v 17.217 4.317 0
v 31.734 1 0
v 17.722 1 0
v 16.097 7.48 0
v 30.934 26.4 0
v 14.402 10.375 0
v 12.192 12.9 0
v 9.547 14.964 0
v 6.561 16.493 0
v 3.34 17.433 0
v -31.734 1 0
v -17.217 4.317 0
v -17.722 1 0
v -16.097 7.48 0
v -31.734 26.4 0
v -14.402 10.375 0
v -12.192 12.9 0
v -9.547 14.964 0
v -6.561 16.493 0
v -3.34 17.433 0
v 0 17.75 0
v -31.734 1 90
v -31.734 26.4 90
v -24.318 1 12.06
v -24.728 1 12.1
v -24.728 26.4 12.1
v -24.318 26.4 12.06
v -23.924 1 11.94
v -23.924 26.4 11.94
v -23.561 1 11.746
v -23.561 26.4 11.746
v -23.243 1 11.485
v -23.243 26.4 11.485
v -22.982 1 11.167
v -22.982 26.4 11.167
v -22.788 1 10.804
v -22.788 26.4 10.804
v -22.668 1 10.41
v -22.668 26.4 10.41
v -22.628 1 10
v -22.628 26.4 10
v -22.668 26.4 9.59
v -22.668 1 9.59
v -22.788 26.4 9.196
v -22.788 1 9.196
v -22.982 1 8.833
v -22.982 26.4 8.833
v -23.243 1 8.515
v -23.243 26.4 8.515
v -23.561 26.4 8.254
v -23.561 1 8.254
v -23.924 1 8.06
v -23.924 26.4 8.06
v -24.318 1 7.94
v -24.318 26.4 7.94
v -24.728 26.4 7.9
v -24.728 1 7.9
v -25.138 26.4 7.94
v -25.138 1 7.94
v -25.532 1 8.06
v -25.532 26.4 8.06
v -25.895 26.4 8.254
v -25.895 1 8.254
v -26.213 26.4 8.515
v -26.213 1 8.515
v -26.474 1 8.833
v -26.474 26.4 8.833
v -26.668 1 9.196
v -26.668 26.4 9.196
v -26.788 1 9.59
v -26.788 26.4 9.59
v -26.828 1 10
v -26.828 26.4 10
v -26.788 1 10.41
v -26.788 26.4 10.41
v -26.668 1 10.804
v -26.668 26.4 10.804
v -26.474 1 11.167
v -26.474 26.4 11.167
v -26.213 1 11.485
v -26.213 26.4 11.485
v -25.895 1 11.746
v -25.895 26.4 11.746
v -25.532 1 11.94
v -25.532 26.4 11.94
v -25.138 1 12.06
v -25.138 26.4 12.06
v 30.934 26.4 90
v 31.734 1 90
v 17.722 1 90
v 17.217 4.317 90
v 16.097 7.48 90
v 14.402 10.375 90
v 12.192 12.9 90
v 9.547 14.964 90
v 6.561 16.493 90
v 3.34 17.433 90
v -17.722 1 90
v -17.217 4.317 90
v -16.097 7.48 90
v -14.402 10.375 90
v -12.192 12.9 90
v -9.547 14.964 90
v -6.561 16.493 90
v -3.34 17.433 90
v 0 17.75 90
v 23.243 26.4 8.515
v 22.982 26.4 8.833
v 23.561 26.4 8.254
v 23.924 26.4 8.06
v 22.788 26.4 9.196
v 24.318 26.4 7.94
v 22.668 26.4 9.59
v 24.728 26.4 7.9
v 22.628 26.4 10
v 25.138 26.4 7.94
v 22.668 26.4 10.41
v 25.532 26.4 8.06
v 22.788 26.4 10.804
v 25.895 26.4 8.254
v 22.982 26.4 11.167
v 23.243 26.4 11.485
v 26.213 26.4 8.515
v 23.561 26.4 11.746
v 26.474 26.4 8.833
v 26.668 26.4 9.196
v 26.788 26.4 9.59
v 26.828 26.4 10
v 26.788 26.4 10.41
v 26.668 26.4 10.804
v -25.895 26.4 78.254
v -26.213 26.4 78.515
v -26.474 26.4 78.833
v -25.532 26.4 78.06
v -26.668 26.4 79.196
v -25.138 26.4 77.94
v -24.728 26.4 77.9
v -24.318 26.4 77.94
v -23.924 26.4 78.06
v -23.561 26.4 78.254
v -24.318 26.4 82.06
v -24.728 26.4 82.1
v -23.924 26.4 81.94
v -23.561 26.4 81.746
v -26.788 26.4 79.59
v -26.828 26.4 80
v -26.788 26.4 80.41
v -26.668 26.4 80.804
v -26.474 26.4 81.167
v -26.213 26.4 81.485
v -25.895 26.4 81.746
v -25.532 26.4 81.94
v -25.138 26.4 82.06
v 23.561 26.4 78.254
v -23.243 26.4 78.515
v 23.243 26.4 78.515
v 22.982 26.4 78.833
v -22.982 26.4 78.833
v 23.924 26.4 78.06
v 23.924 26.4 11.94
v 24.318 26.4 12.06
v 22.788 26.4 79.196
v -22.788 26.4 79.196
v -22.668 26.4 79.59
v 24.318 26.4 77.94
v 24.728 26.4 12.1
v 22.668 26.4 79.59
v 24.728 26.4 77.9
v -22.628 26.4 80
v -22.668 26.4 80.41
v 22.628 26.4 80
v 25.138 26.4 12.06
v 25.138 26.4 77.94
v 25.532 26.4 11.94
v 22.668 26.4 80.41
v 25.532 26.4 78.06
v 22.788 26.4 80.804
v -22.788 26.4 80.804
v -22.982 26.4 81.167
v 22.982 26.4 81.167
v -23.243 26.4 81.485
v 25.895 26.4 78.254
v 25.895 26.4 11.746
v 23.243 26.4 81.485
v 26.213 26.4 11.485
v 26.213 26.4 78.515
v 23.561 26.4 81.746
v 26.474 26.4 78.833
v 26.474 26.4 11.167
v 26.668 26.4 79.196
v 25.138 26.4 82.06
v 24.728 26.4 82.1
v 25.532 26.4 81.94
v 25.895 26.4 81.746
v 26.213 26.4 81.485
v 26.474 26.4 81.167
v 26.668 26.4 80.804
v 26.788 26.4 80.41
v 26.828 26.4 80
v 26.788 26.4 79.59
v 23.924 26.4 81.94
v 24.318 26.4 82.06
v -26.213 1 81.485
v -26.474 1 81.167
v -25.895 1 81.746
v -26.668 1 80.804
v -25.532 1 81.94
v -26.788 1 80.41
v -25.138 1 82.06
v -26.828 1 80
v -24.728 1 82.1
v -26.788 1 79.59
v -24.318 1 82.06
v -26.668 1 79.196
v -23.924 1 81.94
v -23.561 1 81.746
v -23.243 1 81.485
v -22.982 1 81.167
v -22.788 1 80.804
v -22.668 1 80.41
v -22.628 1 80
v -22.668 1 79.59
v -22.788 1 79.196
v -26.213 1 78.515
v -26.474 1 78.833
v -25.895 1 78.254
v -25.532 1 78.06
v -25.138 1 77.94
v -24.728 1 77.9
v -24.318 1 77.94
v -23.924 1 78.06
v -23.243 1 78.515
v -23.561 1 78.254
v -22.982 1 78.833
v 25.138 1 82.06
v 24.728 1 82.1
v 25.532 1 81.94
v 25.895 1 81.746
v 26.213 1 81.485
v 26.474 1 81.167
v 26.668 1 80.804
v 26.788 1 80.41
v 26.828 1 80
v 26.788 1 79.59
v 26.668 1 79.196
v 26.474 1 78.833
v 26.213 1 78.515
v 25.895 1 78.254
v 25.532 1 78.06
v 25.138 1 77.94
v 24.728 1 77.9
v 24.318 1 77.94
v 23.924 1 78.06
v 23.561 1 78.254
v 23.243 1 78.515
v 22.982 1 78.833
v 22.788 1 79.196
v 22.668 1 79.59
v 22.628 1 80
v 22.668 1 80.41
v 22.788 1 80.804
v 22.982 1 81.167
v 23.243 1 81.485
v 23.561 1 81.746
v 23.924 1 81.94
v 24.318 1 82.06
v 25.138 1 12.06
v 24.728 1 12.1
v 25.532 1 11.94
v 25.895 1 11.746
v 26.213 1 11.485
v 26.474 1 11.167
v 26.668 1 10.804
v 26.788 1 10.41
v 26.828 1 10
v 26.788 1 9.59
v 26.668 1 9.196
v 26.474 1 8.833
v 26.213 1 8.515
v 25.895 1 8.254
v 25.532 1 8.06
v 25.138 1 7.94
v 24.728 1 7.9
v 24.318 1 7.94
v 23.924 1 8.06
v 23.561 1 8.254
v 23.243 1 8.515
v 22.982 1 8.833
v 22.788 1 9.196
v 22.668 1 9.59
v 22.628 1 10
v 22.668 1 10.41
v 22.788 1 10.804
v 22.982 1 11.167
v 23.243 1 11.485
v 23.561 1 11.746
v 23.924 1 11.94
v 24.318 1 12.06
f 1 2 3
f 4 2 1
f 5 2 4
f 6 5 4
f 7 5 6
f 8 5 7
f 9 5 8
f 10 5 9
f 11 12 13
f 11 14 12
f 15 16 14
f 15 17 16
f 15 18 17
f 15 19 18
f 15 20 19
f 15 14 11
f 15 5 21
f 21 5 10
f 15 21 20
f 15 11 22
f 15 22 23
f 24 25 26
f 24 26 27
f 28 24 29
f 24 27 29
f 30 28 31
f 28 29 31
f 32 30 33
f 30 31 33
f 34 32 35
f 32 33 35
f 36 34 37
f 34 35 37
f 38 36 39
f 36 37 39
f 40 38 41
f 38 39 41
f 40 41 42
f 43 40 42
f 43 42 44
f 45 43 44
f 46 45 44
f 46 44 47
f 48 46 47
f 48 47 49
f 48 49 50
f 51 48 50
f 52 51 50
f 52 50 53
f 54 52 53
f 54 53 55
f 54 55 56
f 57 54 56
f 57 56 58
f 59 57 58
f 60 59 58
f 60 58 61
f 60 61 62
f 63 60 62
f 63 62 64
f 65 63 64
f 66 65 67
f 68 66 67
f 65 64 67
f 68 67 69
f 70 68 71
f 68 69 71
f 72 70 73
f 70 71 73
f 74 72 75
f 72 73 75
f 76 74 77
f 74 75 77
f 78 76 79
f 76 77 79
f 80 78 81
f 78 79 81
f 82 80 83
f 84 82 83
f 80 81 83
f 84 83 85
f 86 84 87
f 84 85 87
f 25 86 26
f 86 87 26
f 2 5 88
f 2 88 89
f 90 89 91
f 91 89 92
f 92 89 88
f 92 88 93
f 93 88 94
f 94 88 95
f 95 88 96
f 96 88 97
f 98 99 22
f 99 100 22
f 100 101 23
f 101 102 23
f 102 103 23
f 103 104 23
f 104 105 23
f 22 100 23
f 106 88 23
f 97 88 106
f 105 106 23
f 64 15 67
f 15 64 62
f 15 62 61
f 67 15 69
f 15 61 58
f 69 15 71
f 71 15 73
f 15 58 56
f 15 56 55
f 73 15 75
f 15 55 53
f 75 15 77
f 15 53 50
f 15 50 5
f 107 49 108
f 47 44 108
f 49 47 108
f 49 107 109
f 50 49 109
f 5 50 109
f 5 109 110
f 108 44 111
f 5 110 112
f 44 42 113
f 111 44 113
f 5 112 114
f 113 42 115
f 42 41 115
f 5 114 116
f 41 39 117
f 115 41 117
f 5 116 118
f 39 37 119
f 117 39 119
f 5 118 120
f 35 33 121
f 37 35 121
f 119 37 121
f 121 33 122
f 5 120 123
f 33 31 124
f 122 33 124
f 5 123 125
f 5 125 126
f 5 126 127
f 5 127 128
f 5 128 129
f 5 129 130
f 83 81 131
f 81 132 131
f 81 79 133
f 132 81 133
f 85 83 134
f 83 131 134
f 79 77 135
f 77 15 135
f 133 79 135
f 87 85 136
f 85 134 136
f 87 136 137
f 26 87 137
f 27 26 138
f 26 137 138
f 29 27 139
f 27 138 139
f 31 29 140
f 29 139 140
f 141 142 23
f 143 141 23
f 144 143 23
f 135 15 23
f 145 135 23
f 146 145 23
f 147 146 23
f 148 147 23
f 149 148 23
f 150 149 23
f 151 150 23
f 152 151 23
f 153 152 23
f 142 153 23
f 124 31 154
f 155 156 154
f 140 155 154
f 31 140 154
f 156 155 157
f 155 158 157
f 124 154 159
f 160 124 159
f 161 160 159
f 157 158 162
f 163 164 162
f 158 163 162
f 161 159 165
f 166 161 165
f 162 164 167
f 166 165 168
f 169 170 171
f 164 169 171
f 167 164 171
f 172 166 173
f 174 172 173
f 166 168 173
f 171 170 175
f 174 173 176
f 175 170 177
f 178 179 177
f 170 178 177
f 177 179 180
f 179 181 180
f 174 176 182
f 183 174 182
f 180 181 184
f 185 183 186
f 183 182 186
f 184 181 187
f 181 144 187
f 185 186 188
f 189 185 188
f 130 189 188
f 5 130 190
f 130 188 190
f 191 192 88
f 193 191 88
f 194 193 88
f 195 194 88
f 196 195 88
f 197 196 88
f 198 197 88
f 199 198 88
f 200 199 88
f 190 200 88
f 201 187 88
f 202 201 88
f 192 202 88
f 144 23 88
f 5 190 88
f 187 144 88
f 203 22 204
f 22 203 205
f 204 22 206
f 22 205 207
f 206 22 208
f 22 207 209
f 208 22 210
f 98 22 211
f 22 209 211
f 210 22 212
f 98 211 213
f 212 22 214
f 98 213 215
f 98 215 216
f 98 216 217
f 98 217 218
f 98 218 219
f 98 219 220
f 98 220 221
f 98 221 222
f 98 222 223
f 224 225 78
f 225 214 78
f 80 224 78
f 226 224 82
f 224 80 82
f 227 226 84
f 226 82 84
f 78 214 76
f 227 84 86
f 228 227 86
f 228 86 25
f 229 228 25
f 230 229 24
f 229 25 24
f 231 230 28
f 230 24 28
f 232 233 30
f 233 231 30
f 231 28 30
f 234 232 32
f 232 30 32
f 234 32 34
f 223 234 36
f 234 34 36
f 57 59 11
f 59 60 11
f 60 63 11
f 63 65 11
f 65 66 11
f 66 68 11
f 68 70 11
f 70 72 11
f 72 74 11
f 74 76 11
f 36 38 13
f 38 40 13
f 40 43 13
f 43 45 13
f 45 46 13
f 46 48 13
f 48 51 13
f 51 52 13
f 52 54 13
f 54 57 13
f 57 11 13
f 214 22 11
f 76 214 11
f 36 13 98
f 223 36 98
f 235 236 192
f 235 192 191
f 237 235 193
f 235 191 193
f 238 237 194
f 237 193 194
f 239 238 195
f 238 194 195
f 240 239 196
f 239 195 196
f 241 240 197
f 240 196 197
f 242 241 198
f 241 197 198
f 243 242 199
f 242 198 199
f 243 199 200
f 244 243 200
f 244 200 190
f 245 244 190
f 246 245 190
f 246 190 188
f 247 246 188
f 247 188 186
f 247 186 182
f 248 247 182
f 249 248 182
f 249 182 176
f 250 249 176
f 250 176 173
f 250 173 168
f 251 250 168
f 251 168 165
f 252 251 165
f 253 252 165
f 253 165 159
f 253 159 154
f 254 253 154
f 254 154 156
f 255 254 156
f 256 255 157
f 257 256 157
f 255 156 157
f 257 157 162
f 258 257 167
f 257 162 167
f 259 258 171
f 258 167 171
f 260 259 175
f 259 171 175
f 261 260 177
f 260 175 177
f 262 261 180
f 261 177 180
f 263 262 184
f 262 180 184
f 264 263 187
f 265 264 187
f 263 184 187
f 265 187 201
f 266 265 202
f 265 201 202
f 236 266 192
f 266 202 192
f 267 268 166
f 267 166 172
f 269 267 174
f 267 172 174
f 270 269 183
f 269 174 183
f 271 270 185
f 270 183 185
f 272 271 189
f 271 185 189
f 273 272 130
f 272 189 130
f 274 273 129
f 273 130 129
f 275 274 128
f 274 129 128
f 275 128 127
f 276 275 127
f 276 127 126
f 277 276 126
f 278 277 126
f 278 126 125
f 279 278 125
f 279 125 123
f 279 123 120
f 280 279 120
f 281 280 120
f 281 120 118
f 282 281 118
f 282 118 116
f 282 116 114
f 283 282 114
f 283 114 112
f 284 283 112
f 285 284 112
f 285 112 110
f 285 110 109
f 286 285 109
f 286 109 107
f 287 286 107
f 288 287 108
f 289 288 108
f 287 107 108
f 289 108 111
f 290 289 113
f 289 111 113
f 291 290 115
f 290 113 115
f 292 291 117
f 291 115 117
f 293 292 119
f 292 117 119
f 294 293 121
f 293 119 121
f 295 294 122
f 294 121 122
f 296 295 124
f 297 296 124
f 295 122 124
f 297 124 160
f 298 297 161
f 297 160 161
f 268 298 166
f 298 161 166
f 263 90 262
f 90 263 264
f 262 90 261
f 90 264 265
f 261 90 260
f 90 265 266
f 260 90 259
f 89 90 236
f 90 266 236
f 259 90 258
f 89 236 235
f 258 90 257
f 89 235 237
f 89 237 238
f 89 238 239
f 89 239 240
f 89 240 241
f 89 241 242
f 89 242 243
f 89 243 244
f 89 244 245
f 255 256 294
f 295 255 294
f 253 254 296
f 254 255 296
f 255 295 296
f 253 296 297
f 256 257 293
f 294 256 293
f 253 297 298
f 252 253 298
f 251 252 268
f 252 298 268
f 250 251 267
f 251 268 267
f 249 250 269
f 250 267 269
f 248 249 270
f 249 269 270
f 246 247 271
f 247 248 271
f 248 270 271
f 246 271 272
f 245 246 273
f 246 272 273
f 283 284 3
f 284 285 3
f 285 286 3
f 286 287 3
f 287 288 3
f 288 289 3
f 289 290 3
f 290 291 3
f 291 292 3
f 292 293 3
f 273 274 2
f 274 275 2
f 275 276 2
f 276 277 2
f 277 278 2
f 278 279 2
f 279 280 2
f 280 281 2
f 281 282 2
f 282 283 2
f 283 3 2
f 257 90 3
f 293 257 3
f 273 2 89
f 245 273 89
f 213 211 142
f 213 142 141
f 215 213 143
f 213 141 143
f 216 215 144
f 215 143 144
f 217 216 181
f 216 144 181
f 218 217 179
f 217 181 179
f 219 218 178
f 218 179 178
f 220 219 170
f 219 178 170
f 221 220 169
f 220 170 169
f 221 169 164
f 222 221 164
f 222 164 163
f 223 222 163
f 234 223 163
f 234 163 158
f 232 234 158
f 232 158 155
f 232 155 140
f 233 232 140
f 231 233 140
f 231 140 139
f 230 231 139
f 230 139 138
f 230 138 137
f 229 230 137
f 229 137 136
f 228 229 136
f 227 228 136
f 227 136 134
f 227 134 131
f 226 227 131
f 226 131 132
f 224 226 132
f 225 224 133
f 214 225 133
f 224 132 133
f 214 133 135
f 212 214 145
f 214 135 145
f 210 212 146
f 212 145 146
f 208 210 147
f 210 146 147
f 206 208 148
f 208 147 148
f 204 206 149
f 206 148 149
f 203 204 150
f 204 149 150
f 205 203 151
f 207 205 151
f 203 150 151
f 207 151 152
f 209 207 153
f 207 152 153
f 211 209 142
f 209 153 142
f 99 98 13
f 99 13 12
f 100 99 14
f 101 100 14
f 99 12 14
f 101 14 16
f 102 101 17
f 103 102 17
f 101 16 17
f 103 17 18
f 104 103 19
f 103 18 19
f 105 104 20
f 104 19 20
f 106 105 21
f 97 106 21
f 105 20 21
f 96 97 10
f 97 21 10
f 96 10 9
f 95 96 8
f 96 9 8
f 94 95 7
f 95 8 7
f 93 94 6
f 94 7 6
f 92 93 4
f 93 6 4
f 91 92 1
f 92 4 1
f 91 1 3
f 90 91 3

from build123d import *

# Parameters (mm, degrees)
BOSS_EXTRUDE1_DEPTH         = 90
BOSS_EXTRUDE2_DEPTH         = 90
CUT_EXTRUDE1_REACH          = 102.574
SKETCH5_W                   = 62.668099026
SKETCH5_H                   = 5.35
TAP_DRILL_FOR_M5X0_8_TAP1_D = 4.2


with BuildPart() as part:
    # Sketch1 → Boss-Extrude1 (new body)
    with BuildSketch(Plane.XY):
        with BuildLine():
            Line((-31.734248061, 1), (-17.721808598, 1))
            ThreePointArc((-17.721808598, 1), (0, 17.75), (17.721808598, 1))
            Line((17.721808598, 1), (31.734248061, 1))
            ThreePointArc((31.734248061, 1), (0, 31.75), (-31.734248061, 1))
        make_face()
    extrude(amount=BOSS_EXTRUDE1_DEPTH)

    # Sketch4 → Boss-Extrude2 (add)
    with BuildSketch(Plane(origin=(0, 0, 0), x_dir=(-1, 0, 0), z_dir=(0, 0, -1))):
        with BuildLine():
            Line((-30.765263387, 31.75), (-31.734248061, 1))
            ThreePointArc((-31.734248061, 1), (-22.094258304, 22.801452805), (0, 31.75))
            Line((0, 31.75), (-30.765263387, 31.75))
        make_face()
        with BuildLine():
            Line((31.734248061, 31.75), (0, 31.75))
            ThreePointArc((0, 31.75), (22.094258304, 22.801452805), (31.734248061, 1))
            Line((31.734248061, 1), (31.734248061, 31.75))
        make_face()
    extrude(amount=-BOSS_EXTRUDE2_DEPTH)

    # Sketch5 → Cut-Extrude1 (cut, up to next)
    with BuildSketch(Plane.XY.offset(90), mode=Mode.PRIVATE) as cut_extrude1_sk1:
        with Locations((-0.400198548, 29.075)):
            Rectangle(SKETCH5_W, SKETCH5_H)
    cut_extrude1_tool1 = extrude(cut_extrude1_sk1.sketch, amount=-CUT_EXTRUDE1_REACH, mode=Mode.PRIVATE) & part.part
    add(cut_extrude1_tool1.solids().sort_by_distance((-0.400199, 29.075, 90))[0], mode=Mode.SUBTRACT)

    # Tap Drill for M5x0.8 Tap1 (through all)
    with Locations(Plane(origin=(-24.72802833, 1, 80), x_dir=(0, 0, -1), z_dir=(0, -1, 0))):
        with Locations((0, 0), (70, 0), (0, 49.45605666), (70, 49.45605666)):
            Hole(TAP_DRILL_FOR_M5X0_8_TAP1_D / 2)


solid = part.part
